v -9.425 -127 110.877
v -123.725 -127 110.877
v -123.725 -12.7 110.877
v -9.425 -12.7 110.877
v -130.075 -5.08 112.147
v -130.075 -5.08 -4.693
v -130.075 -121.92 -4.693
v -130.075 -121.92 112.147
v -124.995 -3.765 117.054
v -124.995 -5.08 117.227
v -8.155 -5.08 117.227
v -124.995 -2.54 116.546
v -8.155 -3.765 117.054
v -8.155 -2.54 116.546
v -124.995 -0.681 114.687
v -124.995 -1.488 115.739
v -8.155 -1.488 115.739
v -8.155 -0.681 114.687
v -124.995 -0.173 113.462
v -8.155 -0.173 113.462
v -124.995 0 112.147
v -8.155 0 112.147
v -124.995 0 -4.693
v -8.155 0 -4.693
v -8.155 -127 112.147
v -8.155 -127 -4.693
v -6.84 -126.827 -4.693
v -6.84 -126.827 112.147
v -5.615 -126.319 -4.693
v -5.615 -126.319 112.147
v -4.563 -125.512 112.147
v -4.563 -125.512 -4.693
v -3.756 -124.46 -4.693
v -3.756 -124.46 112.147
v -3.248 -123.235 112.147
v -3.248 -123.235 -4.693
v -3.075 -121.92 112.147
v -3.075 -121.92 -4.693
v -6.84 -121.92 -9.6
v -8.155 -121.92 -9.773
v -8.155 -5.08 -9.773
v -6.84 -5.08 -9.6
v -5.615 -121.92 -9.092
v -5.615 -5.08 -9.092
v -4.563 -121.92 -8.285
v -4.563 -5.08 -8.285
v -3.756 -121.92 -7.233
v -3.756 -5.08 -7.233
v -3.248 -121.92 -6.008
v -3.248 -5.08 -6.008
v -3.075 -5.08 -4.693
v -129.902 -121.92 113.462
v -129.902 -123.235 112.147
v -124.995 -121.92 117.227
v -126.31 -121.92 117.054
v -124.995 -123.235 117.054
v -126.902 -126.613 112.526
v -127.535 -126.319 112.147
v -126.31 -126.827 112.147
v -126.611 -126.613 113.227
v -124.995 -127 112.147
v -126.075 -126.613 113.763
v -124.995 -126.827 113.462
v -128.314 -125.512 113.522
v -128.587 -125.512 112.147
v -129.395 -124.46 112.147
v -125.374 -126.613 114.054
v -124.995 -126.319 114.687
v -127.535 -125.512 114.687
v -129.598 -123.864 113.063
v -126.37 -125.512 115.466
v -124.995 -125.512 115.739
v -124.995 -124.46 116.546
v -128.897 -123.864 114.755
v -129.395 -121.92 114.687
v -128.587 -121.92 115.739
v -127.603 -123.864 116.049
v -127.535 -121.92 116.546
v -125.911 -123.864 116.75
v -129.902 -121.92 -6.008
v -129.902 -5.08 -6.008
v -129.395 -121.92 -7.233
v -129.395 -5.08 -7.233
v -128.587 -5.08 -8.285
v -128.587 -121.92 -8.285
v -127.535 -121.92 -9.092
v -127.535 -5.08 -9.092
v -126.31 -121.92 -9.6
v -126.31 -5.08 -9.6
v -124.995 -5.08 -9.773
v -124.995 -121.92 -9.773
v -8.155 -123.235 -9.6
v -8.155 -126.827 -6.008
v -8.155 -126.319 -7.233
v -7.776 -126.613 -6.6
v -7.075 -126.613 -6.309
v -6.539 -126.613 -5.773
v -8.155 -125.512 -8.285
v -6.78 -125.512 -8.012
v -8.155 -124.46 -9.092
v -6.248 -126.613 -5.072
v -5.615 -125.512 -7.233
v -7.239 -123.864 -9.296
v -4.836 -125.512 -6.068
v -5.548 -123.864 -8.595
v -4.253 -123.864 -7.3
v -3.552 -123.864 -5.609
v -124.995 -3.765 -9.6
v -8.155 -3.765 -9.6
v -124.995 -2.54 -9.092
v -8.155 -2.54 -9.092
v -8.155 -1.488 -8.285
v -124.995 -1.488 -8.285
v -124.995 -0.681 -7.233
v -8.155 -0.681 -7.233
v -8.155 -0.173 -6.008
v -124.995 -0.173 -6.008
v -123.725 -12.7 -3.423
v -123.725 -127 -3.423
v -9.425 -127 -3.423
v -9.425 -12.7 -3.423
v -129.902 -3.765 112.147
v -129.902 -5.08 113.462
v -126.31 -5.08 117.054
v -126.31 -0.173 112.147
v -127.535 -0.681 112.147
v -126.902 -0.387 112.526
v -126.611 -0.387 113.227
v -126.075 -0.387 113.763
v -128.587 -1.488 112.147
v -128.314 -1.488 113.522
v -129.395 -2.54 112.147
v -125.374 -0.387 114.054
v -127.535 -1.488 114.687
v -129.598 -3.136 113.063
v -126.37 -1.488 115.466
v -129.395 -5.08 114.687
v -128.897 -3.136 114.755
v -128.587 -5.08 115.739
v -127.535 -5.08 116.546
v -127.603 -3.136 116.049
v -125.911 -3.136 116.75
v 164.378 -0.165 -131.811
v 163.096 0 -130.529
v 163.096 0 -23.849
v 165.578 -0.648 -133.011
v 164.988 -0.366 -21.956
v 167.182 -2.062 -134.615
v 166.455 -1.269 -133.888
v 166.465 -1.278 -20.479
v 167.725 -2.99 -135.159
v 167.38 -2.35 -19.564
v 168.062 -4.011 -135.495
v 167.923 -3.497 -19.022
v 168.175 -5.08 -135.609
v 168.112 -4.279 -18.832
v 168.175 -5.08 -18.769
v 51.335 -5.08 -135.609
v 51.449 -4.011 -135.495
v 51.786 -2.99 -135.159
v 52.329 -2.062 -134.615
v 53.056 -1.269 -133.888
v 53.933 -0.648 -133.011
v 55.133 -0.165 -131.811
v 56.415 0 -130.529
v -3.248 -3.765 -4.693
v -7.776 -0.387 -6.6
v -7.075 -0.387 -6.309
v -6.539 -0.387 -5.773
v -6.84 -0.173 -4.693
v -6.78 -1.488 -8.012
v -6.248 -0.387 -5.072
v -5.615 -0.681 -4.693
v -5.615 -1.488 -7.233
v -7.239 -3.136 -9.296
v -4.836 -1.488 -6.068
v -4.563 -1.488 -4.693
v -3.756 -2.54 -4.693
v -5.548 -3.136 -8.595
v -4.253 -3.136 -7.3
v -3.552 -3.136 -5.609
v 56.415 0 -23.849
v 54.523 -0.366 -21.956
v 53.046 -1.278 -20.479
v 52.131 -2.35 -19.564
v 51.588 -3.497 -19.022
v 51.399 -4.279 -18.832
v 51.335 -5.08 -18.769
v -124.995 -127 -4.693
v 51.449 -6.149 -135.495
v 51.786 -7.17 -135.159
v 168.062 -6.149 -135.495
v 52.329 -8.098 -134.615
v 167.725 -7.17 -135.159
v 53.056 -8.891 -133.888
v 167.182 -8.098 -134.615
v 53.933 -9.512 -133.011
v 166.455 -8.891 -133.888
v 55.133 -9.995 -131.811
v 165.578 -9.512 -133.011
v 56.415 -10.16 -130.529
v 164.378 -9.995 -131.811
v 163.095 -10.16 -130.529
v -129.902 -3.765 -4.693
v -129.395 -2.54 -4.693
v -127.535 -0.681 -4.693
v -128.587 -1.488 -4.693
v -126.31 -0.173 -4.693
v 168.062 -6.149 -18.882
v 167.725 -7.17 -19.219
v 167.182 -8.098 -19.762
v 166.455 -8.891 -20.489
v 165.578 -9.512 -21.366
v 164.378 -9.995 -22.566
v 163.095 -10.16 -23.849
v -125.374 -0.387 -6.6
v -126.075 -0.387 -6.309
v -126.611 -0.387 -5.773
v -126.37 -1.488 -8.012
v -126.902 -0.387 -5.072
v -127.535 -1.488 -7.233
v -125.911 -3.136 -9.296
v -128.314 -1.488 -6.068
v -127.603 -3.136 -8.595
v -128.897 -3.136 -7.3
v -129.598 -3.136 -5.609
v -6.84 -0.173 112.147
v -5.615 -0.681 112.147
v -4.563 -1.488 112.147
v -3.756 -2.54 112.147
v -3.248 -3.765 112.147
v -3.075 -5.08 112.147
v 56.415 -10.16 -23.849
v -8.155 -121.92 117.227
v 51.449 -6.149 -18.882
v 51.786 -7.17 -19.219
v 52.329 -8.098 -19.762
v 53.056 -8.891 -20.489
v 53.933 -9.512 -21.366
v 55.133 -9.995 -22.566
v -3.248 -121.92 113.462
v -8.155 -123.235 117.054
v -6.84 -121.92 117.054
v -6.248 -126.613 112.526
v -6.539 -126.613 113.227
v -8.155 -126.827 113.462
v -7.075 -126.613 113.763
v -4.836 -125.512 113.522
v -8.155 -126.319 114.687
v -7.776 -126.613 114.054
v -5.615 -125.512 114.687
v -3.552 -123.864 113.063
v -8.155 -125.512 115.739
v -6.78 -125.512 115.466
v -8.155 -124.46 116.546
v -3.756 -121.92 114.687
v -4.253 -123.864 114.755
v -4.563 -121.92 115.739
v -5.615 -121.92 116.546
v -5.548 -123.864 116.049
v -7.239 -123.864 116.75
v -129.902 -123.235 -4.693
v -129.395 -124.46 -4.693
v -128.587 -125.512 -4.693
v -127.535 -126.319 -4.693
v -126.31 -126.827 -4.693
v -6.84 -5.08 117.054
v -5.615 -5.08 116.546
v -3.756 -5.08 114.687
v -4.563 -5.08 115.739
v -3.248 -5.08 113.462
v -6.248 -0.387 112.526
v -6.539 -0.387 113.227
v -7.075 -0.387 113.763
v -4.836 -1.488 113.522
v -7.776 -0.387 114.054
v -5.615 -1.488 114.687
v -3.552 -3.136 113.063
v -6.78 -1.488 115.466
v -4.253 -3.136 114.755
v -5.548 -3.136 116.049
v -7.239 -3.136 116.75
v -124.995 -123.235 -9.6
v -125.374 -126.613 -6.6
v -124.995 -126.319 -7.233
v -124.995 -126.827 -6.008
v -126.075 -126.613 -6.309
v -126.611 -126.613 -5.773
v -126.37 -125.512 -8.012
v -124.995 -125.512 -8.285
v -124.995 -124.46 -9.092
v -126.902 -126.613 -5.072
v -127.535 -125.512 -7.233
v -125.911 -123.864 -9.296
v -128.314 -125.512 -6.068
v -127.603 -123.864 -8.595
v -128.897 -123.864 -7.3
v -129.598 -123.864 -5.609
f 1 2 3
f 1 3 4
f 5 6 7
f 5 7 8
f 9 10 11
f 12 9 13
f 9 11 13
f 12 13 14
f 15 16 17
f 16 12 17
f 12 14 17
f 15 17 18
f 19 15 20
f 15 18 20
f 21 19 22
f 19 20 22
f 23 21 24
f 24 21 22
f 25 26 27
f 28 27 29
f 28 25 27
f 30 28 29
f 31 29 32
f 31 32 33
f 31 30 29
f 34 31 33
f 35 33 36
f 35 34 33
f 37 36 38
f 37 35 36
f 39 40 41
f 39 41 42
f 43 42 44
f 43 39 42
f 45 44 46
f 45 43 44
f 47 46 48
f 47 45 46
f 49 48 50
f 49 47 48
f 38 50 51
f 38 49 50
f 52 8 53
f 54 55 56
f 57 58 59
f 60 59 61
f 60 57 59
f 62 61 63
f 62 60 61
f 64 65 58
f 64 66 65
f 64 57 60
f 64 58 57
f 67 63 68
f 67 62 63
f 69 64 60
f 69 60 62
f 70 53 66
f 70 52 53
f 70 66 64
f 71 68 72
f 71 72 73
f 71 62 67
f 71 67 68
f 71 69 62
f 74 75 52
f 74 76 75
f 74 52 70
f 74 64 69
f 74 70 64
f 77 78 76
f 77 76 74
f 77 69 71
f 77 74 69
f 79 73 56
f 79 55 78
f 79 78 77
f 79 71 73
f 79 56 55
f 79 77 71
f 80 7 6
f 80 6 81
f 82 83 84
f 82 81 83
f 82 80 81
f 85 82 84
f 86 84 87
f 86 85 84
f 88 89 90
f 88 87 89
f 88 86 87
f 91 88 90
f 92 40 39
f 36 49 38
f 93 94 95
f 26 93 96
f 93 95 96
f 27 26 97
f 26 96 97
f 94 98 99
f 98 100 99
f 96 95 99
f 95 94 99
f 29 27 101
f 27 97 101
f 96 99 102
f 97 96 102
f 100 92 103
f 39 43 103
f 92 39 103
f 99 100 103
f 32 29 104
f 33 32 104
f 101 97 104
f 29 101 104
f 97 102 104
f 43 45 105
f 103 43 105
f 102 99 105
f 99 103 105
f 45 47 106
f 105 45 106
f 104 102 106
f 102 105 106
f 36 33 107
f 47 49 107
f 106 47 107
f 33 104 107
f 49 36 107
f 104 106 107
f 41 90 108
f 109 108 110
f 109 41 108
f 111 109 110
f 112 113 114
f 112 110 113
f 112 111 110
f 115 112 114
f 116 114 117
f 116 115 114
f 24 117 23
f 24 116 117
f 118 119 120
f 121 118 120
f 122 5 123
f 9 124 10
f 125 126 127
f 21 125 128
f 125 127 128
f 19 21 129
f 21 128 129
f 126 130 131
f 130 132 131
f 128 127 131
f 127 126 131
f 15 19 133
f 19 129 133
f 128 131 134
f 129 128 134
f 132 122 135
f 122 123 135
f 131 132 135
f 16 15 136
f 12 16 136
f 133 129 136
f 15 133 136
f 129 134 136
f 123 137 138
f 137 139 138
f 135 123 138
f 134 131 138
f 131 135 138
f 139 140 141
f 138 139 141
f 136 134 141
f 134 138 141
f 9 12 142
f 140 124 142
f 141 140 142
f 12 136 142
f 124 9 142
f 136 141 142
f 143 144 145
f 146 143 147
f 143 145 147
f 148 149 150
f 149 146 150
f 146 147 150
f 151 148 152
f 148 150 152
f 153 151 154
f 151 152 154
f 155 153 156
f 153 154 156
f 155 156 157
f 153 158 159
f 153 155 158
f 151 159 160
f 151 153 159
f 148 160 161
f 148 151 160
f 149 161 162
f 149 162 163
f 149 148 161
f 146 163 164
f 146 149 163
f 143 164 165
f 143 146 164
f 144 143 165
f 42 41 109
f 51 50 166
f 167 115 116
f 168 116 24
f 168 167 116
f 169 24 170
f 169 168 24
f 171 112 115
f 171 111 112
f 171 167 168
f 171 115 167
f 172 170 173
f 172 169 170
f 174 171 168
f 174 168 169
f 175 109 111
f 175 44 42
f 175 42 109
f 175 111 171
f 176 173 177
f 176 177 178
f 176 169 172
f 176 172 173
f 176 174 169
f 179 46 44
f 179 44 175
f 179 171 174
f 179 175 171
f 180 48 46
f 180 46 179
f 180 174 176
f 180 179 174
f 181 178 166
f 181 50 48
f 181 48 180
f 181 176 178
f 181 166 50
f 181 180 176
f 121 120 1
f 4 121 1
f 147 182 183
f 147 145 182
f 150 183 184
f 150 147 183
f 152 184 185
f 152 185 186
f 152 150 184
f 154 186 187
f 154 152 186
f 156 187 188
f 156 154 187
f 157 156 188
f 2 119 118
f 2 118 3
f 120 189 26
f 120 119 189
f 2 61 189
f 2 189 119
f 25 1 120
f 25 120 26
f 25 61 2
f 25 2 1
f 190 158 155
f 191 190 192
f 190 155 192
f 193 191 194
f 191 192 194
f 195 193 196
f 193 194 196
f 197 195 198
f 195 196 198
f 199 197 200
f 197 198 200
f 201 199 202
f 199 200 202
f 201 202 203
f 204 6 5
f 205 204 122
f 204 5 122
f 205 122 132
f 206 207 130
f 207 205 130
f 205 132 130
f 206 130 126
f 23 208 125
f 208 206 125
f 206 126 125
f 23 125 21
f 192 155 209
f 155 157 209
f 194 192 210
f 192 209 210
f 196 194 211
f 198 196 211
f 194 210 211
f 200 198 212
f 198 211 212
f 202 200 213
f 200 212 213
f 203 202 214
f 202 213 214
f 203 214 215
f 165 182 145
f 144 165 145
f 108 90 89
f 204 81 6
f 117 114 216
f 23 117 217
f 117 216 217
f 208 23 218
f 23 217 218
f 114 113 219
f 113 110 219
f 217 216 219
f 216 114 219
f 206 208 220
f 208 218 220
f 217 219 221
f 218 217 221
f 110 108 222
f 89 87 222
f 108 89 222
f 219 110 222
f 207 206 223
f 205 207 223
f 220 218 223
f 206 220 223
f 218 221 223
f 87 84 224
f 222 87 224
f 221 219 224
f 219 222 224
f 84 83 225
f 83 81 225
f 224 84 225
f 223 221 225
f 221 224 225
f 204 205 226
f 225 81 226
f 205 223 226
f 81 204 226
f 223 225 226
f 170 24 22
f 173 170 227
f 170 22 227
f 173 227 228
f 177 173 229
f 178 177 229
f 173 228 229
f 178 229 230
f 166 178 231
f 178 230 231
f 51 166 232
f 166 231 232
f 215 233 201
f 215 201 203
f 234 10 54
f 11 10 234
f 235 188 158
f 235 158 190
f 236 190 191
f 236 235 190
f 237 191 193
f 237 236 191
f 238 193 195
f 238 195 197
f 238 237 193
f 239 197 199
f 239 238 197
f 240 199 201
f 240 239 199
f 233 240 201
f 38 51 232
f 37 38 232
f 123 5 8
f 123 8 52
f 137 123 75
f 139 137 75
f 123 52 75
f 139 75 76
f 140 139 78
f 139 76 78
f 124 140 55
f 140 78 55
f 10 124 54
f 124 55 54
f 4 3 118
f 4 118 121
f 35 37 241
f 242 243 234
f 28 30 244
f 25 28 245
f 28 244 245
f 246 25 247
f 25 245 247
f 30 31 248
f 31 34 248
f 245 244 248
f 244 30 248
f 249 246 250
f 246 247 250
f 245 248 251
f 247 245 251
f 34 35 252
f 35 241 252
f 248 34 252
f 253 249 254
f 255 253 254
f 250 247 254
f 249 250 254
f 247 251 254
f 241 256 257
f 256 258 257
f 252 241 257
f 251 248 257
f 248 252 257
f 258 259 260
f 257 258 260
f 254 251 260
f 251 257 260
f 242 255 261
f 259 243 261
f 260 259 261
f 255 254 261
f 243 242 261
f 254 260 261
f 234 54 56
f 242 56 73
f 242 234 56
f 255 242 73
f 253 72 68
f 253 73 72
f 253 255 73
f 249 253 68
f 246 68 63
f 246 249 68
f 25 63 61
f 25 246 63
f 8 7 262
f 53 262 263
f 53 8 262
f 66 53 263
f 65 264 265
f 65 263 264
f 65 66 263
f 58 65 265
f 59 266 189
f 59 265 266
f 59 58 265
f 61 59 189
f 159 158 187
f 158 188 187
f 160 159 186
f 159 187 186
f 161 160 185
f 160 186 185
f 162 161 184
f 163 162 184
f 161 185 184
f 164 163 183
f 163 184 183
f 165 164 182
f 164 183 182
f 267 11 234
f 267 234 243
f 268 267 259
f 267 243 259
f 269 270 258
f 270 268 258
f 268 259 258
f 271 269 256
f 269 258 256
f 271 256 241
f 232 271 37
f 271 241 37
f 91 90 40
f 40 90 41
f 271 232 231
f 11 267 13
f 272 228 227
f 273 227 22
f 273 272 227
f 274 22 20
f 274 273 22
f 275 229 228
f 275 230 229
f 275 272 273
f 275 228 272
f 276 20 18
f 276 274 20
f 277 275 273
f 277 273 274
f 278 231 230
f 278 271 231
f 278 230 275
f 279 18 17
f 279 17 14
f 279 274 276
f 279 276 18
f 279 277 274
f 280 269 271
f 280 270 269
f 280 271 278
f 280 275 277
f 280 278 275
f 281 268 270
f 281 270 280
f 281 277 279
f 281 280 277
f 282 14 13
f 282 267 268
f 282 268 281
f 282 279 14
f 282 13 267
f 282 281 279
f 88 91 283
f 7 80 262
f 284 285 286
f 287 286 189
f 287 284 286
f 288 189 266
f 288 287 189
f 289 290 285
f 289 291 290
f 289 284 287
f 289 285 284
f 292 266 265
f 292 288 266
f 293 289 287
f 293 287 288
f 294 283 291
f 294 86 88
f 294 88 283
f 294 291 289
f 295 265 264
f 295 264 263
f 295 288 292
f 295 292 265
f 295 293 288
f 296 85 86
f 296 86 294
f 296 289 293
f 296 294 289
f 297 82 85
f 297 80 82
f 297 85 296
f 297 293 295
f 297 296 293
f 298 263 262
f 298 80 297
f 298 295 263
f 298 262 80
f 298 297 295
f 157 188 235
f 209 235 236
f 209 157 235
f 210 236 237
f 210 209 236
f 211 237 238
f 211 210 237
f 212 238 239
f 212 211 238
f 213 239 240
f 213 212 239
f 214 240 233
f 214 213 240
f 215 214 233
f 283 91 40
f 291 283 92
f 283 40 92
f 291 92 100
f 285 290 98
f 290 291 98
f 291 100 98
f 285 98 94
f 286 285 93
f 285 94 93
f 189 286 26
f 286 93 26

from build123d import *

# Parameters (mm, degrees)
F0_W     = 127
F0_H     = 127
F1_DEPTH = 127
F0_W_2   = 116.84
F0_H_2   = 116.84
F2_DEPTH = 10.16
F3_R     = 5.08
F4_W     = 114.3
F4_H     = 114.3
F5_DEPTH = 114.3
F6_R     = 5.08
F7_R     = 5.07999


# Not quite as in the source:
# - a fillet or chamfer is up to 0.001 mm smaller than in the source, because OpenCascade refuses the exact size


with BuildPart() as f1:
    # F0 (on Front) → F1 (new body)
    with BuildSketch(Plane.XZ):
        with Locations((-66.5750936817, 53.7270531058)):
            Rectangle(F0_W, F0_H)
    extrude(amount=F1_DEPTH)

    # F4 (on face) → F5 (cut)
    with BuildSketch(Plane.XZ.offset(127)):
        with Locations((-66.5750936817, 53.7270531058)):
            Rectangle(F4_W, F4_H)
    extrude(amount=-F5_DEPTH, mode=Mode.SUBTRACT)

    # F6
    f6_edges = [f1.edges().sort_by_distance(p)[0] for p in [
        (-130.075094, -63.5, -9.772947),
        (-3.075094, -63.5, -9.772947),
        (-66.575094, 0, -9.772947),
        (-66.575094, -127, -9.772947),
        (-130.075094, -63.5, 117.227053),
        (-130.075094, 0, 53.727053),
        (-130.075094, -127, 53.727053),
        (-3.075094, -63.5, 117.227053),
        (-3.075094, 0, 53.727053),
        (-3.075094, -127, 53.727053),
        (-66.575094, 0, 117.227053),
        (-66.575094, -127, 117.227053),
    ]]
    fillet(f6_edges, radius=F6_R)


with BuildPart() as f2:
    # F0 (on Front) → F2 (new body)
    with BuildSketch(Plane.XZ):
        with Locations((109.7554949653, -77.1886917222)):
            Rectangle(F0_W_2, F0_H_2)
    extrude(amount=F2_DEPTH)

    # F3
    f3_edges = [f2.edges().sort_by_distance(p)[0] for p in [
        (109.755495, -10.16, -18.768692),
        (51.335495, -10.16, -77.188692),
        (109.755495, -10.16, -135.608692),
        (168.175495, -10.16, -77.188692),
    ]]
    fillet(f3_edges, radius=F3_R)

    # F7 (radius 5.08 in the source; OpenCascade refuses exactly that, so slightly less here)
    f7_edges = [f2.edges().sort_by_distance(p)[0] for p in [
        (109.755495, 0, -18.768692),
        (51.335495, 0, -77.188692),
        (109.755495, 0, -135.608692),
        (168.175495, 0, -77.188692),
    ]]
    fillet(f7_edges, radius=F7_R)


solid = Compound([f1.part, f2.part])
